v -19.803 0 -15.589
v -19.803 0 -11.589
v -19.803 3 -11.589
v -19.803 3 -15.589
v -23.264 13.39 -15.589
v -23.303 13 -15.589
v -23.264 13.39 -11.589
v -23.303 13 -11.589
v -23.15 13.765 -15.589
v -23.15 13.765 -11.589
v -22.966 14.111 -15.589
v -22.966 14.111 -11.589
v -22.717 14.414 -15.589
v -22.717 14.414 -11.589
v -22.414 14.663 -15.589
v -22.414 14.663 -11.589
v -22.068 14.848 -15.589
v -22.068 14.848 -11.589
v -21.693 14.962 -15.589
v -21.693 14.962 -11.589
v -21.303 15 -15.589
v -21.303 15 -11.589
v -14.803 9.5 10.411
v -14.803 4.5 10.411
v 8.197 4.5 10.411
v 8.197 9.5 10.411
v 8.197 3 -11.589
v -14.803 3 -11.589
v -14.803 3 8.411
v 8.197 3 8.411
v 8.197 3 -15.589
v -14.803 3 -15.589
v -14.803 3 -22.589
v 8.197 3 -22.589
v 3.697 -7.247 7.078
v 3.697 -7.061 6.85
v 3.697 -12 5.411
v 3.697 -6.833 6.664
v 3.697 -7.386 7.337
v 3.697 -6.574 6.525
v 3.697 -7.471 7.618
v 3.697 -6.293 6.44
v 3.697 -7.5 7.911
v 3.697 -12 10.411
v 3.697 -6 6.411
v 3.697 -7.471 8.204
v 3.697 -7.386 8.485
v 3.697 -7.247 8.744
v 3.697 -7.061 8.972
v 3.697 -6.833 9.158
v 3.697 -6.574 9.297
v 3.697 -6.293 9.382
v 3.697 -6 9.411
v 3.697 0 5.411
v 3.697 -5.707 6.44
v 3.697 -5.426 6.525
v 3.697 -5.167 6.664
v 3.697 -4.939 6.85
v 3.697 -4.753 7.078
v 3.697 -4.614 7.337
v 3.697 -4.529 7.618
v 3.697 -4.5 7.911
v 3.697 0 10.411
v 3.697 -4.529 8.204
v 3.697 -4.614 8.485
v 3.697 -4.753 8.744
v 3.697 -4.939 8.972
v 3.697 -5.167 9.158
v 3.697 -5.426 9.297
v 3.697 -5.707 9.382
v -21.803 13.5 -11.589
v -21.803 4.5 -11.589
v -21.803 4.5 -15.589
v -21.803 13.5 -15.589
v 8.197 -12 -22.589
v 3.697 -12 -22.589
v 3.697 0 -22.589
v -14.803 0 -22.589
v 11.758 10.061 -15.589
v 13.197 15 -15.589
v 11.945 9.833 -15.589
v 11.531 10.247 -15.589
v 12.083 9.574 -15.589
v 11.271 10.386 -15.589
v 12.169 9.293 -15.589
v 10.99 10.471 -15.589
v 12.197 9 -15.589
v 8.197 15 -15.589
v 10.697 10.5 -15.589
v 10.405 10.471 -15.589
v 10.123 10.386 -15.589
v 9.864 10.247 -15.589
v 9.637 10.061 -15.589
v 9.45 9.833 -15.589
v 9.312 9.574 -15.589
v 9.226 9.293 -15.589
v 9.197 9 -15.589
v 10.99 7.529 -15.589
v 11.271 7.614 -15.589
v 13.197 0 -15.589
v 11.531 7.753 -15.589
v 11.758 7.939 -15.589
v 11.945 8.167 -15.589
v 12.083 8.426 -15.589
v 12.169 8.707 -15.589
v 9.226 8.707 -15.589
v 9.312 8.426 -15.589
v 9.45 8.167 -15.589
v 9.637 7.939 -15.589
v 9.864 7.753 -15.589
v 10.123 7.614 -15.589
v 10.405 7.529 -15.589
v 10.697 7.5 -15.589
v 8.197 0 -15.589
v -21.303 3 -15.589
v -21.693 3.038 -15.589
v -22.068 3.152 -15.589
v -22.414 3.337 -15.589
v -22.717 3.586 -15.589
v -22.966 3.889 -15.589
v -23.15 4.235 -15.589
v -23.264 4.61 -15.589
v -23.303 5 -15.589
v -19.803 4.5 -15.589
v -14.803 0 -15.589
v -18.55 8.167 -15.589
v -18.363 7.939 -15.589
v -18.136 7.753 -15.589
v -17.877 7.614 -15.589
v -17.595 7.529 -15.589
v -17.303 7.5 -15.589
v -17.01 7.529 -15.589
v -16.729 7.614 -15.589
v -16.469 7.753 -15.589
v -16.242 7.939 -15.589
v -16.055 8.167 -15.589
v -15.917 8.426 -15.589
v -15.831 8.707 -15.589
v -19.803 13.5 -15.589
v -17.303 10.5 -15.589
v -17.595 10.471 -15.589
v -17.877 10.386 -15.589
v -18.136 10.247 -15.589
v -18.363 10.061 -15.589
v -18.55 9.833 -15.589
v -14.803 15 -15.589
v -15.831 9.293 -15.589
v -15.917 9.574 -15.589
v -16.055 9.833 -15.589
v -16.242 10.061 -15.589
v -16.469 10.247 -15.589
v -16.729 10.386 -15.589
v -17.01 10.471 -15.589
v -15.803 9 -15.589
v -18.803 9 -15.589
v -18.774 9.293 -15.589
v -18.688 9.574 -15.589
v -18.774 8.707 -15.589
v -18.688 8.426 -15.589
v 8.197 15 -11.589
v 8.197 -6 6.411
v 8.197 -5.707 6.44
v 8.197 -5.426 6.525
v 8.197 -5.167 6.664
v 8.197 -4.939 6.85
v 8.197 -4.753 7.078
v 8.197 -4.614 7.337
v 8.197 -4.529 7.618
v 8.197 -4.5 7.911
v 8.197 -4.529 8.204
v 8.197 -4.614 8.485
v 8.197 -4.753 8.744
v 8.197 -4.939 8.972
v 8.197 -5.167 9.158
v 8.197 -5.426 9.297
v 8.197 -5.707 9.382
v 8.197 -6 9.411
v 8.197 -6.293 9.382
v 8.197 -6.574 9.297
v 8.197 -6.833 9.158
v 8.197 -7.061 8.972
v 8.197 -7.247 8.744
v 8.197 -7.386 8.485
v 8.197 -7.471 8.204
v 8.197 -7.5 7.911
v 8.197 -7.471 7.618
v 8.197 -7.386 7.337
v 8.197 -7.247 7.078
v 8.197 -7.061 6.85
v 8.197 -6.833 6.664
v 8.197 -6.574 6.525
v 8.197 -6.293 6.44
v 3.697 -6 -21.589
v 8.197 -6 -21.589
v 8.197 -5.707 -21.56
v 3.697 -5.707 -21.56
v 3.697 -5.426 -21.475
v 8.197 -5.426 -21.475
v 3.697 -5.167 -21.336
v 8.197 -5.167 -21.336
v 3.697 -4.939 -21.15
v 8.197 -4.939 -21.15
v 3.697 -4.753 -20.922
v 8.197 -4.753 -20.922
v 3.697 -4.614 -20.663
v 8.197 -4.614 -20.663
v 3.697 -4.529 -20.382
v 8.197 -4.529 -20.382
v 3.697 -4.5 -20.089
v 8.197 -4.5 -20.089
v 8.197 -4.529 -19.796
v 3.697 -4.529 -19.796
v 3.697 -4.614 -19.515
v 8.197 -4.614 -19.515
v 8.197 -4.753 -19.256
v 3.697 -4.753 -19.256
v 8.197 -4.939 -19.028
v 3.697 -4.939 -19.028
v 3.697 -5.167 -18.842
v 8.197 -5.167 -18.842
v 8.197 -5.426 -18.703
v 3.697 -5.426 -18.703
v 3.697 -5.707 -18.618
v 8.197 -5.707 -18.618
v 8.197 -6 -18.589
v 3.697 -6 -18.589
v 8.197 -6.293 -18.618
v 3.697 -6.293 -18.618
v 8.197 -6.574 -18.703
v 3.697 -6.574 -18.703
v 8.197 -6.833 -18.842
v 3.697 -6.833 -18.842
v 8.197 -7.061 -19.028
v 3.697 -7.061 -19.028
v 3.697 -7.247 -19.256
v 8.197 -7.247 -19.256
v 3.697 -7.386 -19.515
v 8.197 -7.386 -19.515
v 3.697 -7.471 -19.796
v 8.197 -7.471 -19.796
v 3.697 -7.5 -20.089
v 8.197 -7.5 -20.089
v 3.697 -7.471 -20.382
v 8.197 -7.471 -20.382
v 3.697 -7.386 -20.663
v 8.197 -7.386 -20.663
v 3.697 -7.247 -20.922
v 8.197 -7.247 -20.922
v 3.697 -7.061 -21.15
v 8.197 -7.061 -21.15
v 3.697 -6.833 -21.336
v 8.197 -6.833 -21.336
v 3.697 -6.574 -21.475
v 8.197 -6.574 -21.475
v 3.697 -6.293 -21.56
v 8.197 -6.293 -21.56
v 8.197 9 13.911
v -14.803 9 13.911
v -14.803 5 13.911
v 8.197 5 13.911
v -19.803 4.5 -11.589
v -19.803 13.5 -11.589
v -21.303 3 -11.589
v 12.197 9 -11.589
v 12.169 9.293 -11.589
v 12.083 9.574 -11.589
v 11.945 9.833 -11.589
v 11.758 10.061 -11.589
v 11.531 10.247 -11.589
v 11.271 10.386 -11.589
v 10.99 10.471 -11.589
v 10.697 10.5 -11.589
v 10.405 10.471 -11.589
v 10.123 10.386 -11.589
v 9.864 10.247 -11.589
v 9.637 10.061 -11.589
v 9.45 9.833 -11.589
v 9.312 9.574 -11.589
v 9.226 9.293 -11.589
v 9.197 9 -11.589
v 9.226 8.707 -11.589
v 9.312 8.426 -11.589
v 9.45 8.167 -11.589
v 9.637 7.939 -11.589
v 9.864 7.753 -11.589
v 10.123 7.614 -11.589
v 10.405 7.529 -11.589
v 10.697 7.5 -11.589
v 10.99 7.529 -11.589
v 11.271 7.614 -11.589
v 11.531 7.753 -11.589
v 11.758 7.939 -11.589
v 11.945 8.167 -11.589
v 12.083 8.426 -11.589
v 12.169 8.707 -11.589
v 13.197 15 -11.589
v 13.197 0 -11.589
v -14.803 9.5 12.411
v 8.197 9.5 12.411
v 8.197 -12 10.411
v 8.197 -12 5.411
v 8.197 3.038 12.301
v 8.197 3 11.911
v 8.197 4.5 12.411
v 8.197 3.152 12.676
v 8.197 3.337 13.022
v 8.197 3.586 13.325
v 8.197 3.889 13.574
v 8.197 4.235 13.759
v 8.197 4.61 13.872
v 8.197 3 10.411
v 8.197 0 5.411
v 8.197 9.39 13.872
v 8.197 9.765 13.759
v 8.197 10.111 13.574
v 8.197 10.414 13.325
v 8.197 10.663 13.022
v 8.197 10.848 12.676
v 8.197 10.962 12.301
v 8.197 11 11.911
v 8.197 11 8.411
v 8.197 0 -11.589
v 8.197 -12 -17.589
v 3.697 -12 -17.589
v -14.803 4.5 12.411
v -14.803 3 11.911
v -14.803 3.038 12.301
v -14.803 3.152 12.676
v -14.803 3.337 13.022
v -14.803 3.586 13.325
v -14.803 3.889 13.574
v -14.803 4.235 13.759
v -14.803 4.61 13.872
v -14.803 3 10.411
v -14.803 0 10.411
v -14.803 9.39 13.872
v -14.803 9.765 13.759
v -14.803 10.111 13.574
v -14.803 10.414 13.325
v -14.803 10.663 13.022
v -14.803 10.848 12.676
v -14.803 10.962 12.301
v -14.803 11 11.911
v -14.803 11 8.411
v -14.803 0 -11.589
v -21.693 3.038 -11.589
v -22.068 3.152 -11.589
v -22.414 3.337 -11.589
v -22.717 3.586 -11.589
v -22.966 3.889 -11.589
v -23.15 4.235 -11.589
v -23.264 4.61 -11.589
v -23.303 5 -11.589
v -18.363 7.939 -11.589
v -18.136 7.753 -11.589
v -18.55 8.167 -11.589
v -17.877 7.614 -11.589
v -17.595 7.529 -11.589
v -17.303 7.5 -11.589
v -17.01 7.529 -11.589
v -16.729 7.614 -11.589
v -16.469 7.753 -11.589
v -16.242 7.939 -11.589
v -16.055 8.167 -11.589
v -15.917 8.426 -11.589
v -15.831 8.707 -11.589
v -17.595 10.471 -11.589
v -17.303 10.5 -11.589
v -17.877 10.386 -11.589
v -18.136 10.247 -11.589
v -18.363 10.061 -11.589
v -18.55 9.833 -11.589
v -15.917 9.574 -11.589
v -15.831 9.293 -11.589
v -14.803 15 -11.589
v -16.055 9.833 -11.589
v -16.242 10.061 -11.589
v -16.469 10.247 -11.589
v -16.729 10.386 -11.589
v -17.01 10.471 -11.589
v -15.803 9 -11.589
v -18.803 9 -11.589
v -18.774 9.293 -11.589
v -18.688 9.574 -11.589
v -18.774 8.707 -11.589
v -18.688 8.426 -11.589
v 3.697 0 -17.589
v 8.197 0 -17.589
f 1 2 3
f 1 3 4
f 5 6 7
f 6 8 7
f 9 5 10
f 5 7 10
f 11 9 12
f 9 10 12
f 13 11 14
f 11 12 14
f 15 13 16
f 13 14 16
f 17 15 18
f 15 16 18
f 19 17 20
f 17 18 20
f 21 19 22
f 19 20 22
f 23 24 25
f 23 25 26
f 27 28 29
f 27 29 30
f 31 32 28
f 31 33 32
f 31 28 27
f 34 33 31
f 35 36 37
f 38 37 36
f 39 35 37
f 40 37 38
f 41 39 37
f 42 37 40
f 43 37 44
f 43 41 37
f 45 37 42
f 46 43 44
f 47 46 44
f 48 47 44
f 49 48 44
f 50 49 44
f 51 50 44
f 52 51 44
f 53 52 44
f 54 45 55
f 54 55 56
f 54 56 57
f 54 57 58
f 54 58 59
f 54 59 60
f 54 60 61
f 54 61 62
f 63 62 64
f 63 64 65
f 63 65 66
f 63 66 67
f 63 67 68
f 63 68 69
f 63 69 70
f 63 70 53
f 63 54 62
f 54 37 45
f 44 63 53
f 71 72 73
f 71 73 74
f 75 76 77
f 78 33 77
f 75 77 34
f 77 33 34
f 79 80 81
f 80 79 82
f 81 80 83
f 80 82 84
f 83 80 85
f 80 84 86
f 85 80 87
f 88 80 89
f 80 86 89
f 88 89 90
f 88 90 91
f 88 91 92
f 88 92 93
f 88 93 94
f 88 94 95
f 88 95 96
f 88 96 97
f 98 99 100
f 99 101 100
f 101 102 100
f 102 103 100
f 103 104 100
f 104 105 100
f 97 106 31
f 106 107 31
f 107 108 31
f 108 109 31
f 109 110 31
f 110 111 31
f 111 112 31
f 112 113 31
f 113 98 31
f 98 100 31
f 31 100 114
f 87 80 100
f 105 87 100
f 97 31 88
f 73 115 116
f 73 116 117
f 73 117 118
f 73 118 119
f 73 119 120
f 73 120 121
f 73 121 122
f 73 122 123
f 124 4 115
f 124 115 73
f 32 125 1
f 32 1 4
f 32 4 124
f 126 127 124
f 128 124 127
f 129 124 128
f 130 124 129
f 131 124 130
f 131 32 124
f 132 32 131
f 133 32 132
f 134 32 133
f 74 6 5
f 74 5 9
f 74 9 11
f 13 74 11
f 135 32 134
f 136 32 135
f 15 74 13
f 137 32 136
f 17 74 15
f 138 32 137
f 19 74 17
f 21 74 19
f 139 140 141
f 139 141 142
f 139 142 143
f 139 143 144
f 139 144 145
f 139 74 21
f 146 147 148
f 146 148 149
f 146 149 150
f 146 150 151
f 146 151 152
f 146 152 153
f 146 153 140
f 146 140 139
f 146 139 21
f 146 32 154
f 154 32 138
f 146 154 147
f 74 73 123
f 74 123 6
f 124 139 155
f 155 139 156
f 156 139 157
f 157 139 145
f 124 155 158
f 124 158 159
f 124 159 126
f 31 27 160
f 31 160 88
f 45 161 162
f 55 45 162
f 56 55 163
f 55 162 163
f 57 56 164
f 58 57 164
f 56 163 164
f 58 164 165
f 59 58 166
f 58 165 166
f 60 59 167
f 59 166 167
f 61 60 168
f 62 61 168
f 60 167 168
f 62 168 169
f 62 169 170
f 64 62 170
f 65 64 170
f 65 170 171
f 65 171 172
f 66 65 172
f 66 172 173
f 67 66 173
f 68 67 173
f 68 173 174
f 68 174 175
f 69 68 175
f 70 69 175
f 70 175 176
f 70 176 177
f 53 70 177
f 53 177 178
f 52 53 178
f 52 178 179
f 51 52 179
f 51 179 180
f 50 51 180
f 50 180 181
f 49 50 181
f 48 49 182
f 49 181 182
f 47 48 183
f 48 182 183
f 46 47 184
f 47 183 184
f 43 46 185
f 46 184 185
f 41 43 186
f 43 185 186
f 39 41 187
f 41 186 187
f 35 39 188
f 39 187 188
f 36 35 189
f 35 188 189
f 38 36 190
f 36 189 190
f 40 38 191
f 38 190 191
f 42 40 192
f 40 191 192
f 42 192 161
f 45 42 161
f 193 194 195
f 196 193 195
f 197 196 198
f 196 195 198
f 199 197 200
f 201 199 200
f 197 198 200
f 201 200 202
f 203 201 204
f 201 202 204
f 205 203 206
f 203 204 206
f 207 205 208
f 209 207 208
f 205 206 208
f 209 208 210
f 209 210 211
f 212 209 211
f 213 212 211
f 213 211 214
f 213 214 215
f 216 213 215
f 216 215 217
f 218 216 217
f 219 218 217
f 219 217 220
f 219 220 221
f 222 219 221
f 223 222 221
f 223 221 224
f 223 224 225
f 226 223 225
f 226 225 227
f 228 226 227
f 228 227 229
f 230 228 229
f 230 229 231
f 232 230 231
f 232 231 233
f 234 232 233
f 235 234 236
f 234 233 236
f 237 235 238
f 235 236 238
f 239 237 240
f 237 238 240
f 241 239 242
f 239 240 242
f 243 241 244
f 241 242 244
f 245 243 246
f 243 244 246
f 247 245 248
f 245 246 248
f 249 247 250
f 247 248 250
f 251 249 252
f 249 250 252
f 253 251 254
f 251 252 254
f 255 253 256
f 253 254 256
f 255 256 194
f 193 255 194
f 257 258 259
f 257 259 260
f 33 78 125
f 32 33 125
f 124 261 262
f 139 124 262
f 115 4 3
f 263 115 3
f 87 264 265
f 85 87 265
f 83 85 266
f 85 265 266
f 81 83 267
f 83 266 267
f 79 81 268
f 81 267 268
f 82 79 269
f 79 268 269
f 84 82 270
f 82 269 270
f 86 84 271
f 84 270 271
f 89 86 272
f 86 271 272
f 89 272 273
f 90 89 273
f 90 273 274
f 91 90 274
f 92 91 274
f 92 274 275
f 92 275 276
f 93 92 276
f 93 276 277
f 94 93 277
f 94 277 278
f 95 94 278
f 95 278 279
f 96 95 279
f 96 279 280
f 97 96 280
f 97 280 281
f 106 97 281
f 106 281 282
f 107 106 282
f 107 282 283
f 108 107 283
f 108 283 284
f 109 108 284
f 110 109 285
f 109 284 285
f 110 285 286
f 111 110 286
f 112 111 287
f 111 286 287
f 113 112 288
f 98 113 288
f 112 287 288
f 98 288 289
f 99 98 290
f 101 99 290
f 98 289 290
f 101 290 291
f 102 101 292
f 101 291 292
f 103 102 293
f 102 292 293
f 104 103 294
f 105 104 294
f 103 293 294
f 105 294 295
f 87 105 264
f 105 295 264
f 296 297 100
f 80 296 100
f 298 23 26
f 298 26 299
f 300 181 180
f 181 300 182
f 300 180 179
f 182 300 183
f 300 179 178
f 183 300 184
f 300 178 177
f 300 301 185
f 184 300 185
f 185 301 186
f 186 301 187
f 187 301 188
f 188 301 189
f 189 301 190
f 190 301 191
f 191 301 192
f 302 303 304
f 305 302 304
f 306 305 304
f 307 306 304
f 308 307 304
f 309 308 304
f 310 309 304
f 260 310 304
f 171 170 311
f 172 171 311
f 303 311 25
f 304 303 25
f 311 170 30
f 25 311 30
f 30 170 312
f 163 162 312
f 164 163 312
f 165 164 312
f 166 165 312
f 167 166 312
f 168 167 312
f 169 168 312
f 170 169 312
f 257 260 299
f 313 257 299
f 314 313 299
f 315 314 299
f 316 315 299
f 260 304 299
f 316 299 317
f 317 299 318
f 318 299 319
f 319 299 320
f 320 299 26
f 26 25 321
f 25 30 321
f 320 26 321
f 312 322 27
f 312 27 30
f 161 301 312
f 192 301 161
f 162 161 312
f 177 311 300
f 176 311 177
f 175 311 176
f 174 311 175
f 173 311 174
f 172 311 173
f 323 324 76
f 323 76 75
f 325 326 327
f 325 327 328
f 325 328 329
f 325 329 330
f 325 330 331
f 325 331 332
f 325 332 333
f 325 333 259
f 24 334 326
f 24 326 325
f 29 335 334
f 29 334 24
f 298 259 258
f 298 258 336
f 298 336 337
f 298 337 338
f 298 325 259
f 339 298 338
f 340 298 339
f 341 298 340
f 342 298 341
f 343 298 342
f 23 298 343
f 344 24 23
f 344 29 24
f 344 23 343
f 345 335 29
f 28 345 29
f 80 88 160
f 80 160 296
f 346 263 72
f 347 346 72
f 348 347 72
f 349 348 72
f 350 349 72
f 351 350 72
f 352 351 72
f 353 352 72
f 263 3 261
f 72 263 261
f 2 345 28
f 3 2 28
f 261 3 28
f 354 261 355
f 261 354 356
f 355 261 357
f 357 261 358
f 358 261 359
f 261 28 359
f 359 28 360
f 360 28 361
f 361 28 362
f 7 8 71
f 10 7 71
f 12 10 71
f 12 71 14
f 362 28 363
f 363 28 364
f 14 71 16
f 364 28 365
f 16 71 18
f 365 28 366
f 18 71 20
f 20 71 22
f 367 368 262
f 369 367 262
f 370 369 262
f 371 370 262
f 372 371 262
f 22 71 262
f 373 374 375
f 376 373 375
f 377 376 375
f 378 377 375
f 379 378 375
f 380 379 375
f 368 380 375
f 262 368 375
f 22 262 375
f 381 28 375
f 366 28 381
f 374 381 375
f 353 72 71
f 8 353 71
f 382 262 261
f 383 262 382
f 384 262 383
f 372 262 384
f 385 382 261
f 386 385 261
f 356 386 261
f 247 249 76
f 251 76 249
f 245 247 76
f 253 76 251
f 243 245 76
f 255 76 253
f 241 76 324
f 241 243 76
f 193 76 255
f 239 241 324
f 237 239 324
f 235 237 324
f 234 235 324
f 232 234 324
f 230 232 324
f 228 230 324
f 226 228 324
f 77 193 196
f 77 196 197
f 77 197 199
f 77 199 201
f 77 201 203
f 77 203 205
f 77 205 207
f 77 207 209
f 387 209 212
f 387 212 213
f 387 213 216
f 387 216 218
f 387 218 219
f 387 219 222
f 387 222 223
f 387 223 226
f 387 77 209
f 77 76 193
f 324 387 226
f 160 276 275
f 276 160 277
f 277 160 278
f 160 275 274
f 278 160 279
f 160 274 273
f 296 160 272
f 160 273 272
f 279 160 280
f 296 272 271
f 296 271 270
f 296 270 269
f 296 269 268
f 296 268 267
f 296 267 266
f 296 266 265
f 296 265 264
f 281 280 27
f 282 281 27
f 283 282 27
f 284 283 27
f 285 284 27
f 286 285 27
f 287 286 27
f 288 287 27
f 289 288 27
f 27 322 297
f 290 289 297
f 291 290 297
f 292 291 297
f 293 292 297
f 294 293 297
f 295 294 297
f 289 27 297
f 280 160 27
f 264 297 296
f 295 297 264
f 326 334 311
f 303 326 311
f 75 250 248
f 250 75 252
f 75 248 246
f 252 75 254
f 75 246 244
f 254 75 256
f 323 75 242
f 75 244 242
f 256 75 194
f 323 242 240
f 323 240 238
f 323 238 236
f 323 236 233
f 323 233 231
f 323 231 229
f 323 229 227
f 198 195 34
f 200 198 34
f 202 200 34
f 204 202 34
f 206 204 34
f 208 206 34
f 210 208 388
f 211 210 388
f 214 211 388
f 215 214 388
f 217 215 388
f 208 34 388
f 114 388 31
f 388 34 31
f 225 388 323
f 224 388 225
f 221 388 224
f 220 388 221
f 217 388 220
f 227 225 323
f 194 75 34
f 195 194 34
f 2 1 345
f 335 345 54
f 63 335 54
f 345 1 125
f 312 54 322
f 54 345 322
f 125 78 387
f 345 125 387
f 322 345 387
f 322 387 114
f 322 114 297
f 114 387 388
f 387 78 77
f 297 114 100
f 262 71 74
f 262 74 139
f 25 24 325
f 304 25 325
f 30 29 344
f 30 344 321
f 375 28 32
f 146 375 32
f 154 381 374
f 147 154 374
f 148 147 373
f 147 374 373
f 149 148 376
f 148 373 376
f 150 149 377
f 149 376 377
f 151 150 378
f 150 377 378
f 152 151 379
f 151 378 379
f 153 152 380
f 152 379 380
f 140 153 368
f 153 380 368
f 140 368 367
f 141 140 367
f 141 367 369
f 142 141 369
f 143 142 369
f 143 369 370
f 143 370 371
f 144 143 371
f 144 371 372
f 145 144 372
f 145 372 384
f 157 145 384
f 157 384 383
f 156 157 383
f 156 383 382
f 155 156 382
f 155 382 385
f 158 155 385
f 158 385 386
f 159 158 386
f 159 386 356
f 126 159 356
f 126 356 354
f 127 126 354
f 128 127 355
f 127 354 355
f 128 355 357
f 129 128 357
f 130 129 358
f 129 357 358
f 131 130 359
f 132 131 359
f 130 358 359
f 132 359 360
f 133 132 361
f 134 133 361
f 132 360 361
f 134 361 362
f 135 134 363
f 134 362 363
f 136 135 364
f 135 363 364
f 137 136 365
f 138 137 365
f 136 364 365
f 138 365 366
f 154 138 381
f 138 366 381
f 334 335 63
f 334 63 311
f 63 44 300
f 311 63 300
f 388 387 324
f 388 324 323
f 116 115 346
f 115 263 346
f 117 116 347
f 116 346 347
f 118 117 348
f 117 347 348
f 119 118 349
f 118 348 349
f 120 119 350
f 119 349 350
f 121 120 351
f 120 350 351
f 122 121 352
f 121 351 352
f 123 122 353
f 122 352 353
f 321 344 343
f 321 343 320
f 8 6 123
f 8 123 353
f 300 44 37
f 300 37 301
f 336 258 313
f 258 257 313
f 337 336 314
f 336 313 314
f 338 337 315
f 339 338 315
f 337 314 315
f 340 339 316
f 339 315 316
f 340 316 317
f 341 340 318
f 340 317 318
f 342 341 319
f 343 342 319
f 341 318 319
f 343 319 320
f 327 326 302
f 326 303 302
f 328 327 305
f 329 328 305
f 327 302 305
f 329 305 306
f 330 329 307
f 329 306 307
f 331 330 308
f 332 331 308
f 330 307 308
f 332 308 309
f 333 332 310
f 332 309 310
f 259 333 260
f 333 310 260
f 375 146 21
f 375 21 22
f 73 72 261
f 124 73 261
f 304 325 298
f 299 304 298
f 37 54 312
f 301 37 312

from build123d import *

# Parameters (mm, degrees)
BOSS_EXTRUDE1_DEPTH = 3
SKETCH4_W           = 4.5
SKETCH4_H           = 5
BOSS_EXTRUDE3_DEPTH = 12
SKETCH5_W           = 5
SKETCH5_H           = 4
BOSS_EXTRUDE4_DEPTH = 12
SKETCH6_R           = 1.5
CUT_EXTRUDE1_DEPTH  = 10
SKETCH7_R           = 1.5
CUT_EXTRUDE2_DEPTH  = 10
SKETCH8_W           = 23
SKETCH8_H           = 2
BOSS_EXTRUDE5_DEPTH = 8
SKETCH11_W          = 23
SKETCH11_H          = 8
BOSS_EXTRUDE7_DEPTH = 3.5
SKETCH12_W          = 2
SKETCH12_H          = 5
CUT_EXTRUDE3_DEPTH  = 27.5
FILLET1_R           = 2
SKETCH13_W          = 4
SKETCH13_H          = 12
BOSS_EXTRUDE8_DEPTH = 3.5
SKETCH14_W          = 2
SKETCH14_H          = 9
CUT_EXTRUDE4_DEPTH  = 10
FILLET2_R           = 2


with BuildPart() as part:
    # Sketch1 → Boss-Extrude1 (new body)
    with BuildSketch(Plane(origin=(0, 0, 0), x_dir=(1, 0, 0), z_dir=(0, 1, 0))):
        Polygon((-14.802642583, 11.589093702), (-14.802642583, -10.410906298), (8.197357417, -10.410906298), (8.197357417, 11.589093702), (13.197357417, 11.589093702), (13.197357417, 15.589093702), (8.197357417, 15.589093702), (8.197357417, 22.589093702), (-14.802642583, 22.589093702), (-14.802642583, 15.589093702), (-19.802642583, 15.589093702), (-19.802642583, 11.589093702), align=None)
    extrude(amount=BOSS_EXTRUDE1_DEPTH)

    # Sketch4 → Boss-Extrude3 (add)
    with BuildSketch(Plane.XZ):
        with Locations((5.947357417, -20.089093702)):
            Rectangle(SKETCH4_W, SKETCH4_H)
        with Locations((5.947357417, 7.910906298)):
            Rectangle(SKETCH4_W, SKETCH4_H)
    extrude(amount=BOSS_EXTRUDE3_DEPTH)

    # Sketch5 → Boss-Extrude4 (add)
    with BuildSketch(Plane(origin=(0, 3, 0), x_dir=(1, 0, 0), z_dir=(0, 1, 0))):
        with Locations((-17.302642583, 13.589093702)):
            Rectangle(SKETCH5_W, SKETCH5_H)
        with Locations((10.697357417, 13.589093702)):
            Rectangle(SKETCH5_W, SKETCH5_H)
    extrude(amount=BOSS_EXTRUDE4_DEPTH)

    # Sketch6 → Cut-Extrude1 (cut)
    with BuildSketch(Plane.XY.offset(-11.589093702)):
        with Locations((-17.302642583, 9)):
            Circle(SKETCH6_R)
        with Locations((10.697357417, 9)):
            Circle(SKETCH6_R)
    extrude(amount=-CUT_EXTRUDE1_DEPTH, mode=Mode.SUBTRACT)

    # Sketch7 → Cut-Extrude2 (cut)
    with BuildSketch(Plane(origin=(8.197357417, 0, 0), x_dir=(0, 0, -1), z_dir=(1, 0, 0))):
        with Locations((-7.910906298, -6)):
            Circle(SKETCH7_R)
        with Locations((20.089093702, -6)):
            Circle(SKETCH7_R)
    extrude(amount=-CUT_EXTRUDE2_DEPTH, mode=Mode.SUBTRACT)

    # Sketch8 → Boss-Extrude5 (add)
    with BuildSketch(Plane(origin=(0, 3, 0), x_dir=(1, 0, 0), z_dir=(0, 1, 0))):
        with Locations((-3.302642583, -9.410906298)):
            Rectangle(SKETCH8_W, SKETCH8_H)
    extrude(amount=BOSS_EXTRUDE5_DEPTH)

    # Sketch11 → Boss-Extrude7 (add)
    with BuildSketch(Plane.XY.offset(10.410906298)):
        with Locations((-3.302642583, 7)):
            Rectangle(SKETCH11_W, SKETCH11_H)
    extrude(amount=BOSS_EXTRUDE7_DEPTH)

    # Sketch12 → Cut-Extrude3 (cut)
    with BuildSketch(Plane.ZY.offset(14.802642583)):
        with Locations((11.410906298, 7)):
            Rectangle(SKETCH12_W, SKETCH12_H)
    extrude(amount=-CUT_EXTRUDE3_DEPTH, mode=Mode.SUBTRACT)

    # Fillet1
    fillet1_edges = [part.edges().sort_by_distance(p)[0] for p in [
        (-3.302642583, 3, 13.910906298),
        (-3.302642583, 11, 13.910906298),
    ]]
    fillet(fillet1_edges, radius=FILLET1_R)

    # Sketch13 → Boss-Extrude8 (add)
    with BuildSketch(Plane.ZY.offset(19.802642583)):
        with Locations((-13.589093702, 9)):
            Rectangle(SKETCH13_W, SKETCH13_H)
    extrude(amount=BOSS_EXTRUDE8_DEPTH)

    # Sketch14 → Cut-Extrude4 (cut)
    with BuildSketch(Plane.XY.offset(-11.589093702)):
        with Locations((-20.802642583, 9)):
            Rectangle(SKETCH14_W, SKETCH14_H)
    extrude(amount=-CUT_EXTRUDE4_DEPTH, mode=Mode.SUBTRACT)

    # Fillet2
    fillet2_edges = [part.edges().sort_by_distance(p)[0] for p in [
        (-23.302642583, 3, -13.589093702),
        (-23.302642583, 15, -13.589093702),
    ]]
    fillet(fillet2_edges, radius=FILLET2_R)


solid = part.part
